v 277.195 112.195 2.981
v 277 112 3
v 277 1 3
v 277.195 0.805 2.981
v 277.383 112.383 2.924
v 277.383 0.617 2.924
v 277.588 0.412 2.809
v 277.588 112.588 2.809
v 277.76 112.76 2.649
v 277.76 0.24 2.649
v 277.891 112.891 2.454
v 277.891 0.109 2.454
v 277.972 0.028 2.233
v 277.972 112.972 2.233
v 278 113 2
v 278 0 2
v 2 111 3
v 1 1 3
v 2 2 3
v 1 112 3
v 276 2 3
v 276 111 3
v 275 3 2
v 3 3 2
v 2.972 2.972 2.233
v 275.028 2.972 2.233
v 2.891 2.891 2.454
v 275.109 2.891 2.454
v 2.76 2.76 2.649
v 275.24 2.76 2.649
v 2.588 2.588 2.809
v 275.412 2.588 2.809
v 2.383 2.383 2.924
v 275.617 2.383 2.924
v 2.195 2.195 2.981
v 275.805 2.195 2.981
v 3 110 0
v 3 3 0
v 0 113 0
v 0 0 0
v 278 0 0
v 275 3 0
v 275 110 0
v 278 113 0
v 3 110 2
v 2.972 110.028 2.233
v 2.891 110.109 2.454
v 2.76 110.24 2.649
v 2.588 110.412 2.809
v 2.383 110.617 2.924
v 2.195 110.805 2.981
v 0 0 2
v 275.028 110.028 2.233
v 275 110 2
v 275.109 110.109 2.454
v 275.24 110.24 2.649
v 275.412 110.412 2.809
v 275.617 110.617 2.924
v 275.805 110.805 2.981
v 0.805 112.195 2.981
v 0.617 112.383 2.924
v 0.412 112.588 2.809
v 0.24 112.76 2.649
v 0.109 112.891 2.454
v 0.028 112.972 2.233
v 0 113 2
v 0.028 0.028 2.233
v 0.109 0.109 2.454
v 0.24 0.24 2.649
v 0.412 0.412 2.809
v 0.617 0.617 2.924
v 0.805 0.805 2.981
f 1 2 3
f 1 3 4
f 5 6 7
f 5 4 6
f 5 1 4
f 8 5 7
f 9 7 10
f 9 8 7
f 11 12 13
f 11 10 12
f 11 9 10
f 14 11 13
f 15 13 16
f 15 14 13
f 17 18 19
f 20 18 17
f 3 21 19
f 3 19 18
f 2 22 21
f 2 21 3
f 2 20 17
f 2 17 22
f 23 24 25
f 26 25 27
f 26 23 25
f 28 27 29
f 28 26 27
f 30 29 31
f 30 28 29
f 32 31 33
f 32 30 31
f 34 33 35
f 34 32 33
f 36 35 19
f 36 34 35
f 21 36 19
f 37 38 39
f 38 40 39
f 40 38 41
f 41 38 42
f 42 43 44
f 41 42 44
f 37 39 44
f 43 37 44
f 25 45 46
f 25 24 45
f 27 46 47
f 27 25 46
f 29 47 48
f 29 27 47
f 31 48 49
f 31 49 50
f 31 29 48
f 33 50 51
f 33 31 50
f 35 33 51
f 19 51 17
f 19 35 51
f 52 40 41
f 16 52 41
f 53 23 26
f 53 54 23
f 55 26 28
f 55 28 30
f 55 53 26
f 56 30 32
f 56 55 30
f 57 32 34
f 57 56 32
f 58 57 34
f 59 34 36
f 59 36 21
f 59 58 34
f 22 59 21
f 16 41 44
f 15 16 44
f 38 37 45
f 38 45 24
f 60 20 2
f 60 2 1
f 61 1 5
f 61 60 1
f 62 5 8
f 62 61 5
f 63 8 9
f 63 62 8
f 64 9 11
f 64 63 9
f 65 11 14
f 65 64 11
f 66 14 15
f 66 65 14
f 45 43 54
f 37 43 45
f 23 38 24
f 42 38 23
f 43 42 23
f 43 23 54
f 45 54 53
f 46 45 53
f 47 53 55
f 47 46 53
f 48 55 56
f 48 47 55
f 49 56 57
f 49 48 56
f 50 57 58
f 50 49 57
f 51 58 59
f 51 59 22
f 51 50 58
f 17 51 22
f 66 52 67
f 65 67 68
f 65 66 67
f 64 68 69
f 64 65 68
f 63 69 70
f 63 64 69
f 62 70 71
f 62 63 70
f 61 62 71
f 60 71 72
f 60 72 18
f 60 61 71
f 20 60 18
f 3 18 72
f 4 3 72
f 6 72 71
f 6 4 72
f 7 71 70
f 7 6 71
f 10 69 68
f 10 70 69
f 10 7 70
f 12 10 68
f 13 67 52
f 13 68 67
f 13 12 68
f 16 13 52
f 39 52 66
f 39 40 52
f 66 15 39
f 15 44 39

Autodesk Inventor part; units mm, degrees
ref_plane "YZ Plane" through (0, 0, 0) normal (1, 0, 0) x (0, 1, 0)
ref_plane "XZ Plane" through (0, 0, 0) normal (0, 1, 0) x (-1, 0, 0)
ref_plane "XY Plane" through (0, 0, 0) normal (0, 0, 1) x (1, 0, 0)
sketch "Skizze1" plane through (0, 0, 0) normal (0, 0, 1) x (1, 0, 0)
  line L0 (-55.6, 0) -> (333.6, 0) projected
  line L1 (0, -22.6) -> (0, 135.6) projected
  line L2 (3, 3) -> (275, 3)
  line L3 (275, 3) -> (275, 110)
  line L4 (275, 110) -> (3, 110)
  line L5 (3, 110) -> (3, 3)
  line L6 (0, 0) -> (278, 0)
  line L7 (278, 0) -> (278, 113)
  line L8 (278, 113) -> (0, 113)
  line L9 (0, 113) -> (0, 0)
  point P0 (0, 113)
  point P1 (278, 0)
  dimension "d0" = 272
  dimension "d1" = 107
  dimension "d2" = 3
  dimension "d3" = 3
  dimension "d4" = 3
  dimension "d5" = 3
extrude "Extrusion1" add sketch "Skizze1" along normal blind 3
fillet "Rundung1" radius 1 8 edges at (139, 110, 3) (139, 113, 3) (275, 56.5, 3) (278, 56.5, 3) (0, 56.5, 3) (3, 56.5, 3) (139, 3, 3) (139, 0, 3)
properties part number "Dichtung_1" material "Gummi"
